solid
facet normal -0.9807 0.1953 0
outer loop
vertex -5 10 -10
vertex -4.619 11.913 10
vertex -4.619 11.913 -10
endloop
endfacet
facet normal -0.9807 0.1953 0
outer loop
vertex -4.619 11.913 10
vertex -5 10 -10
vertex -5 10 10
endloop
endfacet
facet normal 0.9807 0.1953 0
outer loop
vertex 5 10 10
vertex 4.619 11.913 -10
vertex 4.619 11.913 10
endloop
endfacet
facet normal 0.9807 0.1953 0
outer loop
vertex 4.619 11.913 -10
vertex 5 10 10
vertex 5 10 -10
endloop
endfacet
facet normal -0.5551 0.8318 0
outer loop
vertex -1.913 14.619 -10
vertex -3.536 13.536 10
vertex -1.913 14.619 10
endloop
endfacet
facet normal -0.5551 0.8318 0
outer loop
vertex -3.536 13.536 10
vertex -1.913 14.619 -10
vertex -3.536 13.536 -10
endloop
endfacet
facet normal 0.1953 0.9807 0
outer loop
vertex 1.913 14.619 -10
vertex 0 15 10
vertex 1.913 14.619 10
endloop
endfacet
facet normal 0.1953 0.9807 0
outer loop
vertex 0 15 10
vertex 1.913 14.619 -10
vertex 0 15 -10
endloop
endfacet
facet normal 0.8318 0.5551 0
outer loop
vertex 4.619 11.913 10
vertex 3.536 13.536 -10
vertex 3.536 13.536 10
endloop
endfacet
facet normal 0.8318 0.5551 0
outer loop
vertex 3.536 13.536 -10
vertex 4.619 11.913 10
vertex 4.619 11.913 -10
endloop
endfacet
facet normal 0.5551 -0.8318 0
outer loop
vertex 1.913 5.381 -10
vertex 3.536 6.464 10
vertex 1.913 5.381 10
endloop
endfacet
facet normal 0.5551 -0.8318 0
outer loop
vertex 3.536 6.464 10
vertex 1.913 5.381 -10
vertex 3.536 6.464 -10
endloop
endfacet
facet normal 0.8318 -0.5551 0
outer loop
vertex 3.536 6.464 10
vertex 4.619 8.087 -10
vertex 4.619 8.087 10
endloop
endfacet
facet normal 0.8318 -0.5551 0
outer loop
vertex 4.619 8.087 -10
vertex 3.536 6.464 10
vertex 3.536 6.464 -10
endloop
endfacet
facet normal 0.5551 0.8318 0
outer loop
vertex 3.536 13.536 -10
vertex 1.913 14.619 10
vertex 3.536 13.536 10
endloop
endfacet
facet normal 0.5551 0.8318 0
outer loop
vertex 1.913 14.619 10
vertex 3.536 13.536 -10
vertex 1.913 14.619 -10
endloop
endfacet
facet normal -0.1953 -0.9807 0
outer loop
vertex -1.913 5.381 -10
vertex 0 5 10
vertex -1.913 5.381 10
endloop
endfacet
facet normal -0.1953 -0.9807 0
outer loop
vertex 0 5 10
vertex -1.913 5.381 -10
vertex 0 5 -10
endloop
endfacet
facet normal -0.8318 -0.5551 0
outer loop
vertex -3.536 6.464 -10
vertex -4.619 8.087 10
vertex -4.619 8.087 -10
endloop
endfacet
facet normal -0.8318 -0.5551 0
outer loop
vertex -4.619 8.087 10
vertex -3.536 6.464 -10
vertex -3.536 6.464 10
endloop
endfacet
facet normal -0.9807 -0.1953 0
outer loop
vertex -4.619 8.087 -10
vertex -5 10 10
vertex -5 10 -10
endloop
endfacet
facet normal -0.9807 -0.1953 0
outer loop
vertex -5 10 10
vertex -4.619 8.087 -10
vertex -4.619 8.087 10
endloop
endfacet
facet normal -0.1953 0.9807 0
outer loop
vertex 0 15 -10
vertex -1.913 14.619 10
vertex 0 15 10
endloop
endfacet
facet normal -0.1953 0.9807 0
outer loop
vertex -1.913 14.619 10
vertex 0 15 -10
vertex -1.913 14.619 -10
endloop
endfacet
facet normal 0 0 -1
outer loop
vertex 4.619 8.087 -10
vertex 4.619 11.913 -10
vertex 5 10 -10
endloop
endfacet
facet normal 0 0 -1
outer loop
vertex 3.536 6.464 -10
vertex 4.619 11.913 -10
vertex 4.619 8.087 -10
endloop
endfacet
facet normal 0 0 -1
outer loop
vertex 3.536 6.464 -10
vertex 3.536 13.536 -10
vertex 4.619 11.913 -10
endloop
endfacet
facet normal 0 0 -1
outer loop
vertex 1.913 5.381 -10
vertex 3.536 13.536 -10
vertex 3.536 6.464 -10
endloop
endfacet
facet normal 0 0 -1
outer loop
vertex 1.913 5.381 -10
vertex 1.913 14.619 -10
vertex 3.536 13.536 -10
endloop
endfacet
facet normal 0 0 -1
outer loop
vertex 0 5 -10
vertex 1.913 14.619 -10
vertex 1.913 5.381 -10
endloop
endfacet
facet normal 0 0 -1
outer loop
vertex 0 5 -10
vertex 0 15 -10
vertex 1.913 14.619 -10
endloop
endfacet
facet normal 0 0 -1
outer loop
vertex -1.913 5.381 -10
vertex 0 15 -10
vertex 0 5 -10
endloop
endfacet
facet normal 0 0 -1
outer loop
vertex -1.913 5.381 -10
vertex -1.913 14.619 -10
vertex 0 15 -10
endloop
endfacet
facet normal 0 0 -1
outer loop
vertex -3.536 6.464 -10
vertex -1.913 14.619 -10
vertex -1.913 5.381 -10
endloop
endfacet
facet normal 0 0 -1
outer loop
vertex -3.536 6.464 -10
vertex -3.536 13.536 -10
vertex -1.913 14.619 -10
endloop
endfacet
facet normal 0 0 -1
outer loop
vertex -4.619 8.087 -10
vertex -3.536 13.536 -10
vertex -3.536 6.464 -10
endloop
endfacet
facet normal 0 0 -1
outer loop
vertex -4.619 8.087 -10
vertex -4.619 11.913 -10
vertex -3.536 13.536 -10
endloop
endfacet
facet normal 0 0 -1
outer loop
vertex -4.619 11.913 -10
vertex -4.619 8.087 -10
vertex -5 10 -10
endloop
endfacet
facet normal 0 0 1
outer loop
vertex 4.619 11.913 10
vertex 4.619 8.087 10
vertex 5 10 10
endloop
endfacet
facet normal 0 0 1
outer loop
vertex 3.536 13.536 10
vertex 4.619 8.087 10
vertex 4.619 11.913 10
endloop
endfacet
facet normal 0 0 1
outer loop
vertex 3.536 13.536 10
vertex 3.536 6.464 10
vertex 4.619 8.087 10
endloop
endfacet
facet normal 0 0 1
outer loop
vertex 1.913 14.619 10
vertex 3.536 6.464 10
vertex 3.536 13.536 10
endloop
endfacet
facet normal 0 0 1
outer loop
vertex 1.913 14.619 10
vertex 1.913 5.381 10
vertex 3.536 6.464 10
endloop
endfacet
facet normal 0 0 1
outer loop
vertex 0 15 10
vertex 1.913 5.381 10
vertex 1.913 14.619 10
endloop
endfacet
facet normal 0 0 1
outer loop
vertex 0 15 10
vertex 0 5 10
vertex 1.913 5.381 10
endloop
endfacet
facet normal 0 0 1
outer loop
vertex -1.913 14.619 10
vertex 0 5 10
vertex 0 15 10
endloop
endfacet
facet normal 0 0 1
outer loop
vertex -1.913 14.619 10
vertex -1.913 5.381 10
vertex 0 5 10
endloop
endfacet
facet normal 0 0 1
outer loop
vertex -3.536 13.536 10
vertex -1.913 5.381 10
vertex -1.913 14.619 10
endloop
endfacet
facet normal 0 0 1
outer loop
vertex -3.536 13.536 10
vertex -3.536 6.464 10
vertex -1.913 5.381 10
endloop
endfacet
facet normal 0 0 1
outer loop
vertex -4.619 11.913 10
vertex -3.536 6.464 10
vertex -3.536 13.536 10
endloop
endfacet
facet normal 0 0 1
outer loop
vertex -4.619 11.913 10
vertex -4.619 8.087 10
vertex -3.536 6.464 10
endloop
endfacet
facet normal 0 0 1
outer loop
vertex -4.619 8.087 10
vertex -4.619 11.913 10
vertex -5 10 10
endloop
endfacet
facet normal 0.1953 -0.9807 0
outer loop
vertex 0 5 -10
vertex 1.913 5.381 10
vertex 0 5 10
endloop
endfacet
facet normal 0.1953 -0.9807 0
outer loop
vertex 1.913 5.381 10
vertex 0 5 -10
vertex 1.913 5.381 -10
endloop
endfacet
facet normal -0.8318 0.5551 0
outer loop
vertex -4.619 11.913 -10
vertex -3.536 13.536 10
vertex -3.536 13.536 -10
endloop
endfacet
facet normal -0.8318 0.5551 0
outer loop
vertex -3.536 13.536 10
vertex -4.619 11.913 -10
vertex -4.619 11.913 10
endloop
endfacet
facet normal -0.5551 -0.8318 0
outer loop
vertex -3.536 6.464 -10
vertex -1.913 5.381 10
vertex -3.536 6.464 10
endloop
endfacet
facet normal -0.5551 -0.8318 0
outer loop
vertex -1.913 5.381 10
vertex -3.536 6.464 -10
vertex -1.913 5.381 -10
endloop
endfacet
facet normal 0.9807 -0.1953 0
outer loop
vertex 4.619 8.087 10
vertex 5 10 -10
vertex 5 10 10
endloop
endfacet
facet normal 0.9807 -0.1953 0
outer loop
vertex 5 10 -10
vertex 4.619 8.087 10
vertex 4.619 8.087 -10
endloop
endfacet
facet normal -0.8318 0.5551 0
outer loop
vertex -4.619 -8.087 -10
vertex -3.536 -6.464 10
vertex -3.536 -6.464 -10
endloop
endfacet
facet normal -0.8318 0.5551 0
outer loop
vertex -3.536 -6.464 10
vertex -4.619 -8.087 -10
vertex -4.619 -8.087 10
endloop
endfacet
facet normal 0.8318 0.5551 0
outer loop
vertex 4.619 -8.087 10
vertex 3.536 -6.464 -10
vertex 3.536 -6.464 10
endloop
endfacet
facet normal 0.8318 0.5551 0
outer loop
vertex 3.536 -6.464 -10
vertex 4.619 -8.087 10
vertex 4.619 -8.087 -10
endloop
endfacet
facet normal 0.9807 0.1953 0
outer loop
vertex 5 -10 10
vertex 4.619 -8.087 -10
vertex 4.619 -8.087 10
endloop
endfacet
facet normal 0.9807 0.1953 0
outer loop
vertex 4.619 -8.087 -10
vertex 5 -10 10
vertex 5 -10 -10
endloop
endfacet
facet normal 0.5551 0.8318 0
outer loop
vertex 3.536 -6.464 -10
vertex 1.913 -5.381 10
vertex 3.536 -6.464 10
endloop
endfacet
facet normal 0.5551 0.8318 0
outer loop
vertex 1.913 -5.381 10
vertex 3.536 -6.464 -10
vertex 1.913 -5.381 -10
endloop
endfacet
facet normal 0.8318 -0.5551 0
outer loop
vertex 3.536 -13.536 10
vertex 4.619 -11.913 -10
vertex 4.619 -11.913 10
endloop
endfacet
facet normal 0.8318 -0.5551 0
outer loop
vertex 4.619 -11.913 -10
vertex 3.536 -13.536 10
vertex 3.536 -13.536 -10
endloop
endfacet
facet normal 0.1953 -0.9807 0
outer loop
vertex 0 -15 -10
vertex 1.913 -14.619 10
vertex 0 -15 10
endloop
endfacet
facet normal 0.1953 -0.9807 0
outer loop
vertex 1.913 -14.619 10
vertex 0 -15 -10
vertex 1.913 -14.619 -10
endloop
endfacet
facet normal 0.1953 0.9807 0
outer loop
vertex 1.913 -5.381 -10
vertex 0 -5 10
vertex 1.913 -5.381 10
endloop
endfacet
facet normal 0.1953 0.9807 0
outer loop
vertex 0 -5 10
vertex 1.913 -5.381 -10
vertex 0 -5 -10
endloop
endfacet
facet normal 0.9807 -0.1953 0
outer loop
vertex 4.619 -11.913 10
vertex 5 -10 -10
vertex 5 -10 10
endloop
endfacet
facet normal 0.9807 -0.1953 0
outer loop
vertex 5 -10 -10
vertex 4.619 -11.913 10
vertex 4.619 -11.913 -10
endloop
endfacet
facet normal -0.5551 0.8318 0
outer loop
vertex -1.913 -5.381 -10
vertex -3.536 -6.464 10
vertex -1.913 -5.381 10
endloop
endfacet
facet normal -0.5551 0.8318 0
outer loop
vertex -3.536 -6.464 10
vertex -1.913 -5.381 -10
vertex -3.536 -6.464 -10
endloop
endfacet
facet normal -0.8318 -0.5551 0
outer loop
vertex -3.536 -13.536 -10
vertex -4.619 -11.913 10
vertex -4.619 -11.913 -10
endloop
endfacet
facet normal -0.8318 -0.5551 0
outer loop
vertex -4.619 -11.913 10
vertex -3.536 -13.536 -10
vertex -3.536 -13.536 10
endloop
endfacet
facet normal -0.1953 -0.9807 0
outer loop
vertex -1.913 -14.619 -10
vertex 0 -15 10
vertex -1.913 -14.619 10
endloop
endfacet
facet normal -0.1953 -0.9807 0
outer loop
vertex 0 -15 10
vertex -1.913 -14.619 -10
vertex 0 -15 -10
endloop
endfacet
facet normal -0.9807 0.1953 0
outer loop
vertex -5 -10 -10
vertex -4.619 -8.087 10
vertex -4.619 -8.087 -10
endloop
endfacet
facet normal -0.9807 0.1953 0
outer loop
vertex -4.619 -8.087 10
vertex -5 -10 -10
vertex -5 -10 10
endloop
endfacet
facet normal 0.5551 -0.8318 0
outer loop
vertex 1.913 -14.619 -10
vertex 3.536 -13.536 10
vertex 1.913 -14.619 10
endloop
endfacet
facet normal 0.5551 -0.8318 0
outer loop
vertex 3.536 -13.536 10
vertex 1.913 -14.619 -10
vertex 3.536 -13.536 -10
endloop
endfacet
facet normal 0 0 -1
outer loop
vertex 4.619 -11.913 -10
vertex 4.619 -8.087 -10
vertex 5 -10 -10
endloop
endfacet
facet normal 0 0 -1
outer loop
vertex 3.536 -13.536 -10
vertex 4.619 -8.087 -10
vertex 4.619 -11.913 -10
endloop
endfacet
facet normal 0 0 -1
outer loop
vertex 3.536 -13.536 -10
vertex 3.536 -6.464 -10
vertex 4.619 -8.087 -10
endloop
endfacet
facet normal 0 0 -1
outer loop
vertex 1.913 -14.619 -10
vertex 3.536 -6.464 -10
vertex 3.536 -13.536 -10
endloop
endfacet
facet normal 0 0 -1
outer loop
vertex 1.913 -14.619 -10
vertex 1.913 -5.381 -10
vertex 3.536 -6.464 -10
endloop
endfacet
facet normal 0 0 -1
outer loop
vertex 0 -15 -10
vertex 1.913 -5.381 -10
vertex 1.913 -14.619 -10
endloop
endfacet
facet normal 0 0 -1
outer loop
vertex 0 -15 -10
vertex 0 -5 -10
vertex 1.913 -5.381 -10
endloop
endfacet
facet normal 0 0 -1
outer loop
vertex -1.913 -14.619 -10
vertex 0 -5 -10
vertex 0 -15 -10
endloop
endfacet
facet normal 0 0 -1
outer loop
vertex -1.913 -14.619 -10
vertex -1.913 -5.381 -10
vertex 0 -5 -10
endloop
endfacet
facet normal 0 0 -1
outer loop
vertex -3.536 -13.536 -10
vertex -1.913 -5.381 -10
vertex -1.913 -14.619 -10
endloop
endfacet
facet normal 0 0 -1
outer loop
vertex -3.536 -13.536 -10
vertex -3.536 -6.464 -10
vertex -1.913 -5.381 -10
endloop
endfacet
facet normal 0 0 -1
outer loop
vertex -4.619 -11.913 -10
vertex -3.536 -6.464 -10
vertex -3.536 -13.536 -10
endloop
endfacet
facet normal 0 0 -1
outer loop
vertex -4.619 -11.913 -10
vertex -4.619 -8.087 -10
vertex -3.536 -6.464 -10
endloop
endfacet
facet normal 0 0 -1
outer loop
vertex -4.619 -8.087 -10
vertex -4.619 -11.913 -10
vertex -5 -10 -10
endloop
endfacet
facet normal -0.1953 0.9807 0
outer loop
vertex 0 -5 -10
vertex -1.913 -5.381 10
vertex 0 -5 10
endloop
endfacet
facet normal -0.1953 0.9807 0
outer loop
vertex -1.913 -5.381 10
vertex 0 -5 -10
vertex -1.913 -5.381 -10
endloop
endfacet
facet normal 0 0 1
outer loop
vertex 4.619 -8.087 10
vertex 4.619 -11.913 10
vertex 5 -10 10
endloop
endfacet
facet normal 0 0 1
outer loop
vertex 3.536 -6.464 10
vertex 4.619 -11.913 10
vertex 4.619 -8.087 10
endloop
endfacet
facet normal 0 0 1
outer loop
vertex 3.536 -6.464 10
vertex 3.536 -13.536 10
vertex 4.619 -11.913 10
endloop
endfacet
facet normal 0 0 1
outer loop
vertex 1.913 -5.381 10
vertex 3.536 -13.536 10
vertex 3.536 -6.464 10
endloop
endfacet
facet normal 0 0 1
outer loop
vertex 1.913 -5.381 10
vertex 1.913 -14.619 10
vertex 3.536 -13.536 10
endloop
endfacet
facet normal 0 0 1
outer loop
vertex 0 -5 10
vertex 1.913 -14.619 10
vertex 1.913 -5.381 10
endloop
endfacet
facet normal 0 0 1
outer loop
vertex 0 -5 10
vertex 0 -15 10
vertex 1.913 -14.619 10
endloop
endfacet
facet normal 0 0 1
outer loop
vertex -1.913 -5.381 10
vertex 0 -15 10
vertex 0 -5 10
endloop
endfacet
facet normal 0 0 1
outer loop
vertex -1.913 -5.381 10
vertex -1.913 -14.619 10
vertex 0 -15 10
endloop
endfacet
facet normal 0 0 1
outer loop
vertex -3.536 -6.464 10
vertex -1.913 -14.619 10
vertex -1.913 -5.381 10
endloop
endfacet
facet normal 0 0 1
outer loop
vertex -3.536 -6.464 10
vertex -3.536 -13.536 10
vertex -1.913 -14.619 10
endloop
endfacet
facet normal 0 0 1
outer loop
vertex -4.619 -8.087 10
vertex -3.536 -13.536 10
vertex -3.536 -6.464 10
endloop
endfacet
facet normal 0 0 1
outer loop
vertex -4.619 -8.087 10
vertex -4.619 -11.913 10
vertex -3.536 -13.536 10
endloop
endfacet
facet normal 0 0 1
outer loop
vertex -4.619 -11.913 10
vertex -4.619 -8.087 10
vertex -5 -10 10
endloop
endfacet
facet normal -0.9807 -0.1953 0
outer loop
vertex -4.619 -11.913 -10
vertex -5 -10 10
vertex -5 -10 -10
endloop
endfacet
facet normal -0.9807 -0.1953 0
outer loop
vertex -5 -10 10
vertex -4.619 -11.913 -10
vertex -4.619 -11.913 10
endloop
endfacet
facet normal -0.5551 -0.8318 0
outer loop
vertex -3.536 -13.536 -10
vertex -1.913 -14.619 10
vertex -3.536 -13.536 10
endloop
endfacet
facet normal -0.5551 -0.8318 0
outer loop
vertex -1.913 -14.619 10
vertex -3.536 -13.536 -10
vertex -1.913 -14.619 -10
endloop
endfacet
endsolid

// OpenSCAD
color("white"){
    translate([0, 10, 0]) {
        cylinder(r=5, h=20, center=true);
    }
}

color("black"){
    translate([0, -10, 0]) {
        cylinder(r=5, h=20, center=true);
    }
}
